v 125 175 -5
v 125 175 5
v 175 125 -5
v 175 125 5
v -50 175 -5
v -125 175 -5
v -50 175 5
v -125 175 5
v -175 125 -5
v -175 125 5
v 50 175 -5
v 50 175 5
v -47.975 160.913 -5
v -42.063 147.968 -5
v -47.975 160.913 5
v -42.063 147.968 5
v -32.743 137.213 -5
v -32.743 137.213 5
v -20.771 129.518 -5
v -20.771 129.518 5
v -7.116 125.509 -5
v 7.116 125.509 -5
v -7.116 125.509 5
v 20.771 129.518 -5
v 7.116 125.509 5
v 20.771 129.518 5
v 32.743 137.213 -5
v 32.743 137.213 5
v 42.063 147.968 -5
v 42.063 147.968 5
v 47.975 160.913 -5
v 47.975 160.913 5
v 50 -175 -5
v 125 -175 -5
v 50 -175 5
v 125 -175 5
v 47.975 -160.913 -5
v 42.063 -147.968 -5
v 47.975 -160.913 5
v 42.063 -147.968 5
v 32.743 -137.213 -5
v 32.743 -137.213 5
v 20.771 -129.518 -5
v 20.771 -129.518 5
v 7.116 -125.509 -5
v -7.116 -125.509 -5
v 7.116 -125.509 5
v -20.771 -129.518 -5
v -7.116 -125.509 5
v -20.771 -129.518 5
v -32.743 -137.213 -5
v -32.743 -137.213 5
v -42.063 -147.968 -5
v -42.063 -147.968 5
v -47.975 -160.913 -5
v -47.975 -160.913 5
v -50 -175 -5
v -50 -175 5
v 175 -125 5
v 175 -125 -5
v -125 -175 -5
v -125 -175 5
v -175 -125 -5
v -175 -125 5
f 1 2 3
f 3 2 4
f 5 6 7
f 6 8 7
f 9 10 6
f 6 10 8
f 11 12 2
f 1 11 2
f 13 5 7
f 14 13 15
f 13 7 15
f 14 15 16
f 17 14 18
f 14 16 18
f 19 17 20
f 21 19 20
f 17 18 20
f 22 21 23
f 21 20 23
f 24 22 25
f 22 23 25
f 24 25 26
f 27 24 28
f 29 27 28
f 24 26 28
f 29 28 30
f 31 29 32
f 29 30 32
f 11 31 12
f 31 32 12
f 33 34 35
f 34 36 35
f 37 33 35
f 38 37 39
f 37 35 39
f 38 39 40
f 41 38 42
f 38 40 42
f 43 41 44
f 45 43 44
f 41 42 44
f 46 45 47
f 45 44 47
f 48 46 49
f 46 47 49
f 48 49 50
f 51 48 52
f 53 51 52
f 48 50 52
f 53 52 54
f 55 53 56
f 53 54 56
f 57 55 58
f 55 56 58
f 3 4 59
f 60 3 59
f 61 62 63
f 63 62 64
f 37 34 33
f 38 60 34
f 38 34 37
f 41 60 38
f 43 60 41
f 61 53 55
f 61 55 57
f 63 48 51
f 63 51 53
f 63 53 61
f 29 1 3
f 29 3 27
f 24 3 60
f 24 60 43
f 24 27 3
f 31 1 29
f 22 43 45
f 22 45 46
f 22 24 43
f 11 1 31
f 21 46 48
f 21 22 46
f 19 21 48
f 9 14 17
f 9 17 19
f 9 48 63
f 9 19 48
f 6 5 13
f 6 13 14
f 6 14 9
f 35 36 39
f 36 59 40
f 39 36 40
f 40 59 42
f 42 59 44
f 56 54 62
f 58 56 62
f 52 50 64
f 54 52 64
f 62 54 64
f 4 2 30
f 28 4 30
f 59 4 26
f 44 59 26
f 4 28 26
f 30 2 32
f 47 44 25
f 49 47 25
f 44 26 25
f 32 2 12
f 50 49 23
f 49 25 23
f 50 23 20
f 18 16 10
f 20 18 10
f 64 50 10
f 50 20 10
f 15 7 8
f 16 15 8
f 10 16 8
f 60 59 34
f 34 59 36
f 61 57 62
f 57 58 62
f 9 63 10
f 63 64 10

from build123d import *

# Parameters (mm, degrees)
BOSS_EXTRUDE1_DEPTH = 5


with BuildPart() as part:
    # Sketch1 → Boss-Extrude1 (new body, symmetric)
    with BuildSketch(Plane.XY):
        with BuildLine():
            Line((175, 125), (175, -125))
            Line((175, -125), (125, -175))
            Line((125, -175), (50, -175))
            ThreePointArc((50, -175), (0, -125), (-50, -175))
            Line((-50, -175), (-125, -175))
            Line((-125, -175), (-175, -125))
            Line((-175, -125), (-175, 125))
            Line((-175, 125), (-125, 175))
            Line((-125, 175), (-50, 175))
            ThreePointArc((-50, 175), (0, 125), (50, 175))
            Line((50, 175), (125, 175))
            Line((125, 175), (175, 125))
        make_face()
    extrude(amount=BOSS_EXTRUDE1_DEPTH, both=True)


solid = part.part
